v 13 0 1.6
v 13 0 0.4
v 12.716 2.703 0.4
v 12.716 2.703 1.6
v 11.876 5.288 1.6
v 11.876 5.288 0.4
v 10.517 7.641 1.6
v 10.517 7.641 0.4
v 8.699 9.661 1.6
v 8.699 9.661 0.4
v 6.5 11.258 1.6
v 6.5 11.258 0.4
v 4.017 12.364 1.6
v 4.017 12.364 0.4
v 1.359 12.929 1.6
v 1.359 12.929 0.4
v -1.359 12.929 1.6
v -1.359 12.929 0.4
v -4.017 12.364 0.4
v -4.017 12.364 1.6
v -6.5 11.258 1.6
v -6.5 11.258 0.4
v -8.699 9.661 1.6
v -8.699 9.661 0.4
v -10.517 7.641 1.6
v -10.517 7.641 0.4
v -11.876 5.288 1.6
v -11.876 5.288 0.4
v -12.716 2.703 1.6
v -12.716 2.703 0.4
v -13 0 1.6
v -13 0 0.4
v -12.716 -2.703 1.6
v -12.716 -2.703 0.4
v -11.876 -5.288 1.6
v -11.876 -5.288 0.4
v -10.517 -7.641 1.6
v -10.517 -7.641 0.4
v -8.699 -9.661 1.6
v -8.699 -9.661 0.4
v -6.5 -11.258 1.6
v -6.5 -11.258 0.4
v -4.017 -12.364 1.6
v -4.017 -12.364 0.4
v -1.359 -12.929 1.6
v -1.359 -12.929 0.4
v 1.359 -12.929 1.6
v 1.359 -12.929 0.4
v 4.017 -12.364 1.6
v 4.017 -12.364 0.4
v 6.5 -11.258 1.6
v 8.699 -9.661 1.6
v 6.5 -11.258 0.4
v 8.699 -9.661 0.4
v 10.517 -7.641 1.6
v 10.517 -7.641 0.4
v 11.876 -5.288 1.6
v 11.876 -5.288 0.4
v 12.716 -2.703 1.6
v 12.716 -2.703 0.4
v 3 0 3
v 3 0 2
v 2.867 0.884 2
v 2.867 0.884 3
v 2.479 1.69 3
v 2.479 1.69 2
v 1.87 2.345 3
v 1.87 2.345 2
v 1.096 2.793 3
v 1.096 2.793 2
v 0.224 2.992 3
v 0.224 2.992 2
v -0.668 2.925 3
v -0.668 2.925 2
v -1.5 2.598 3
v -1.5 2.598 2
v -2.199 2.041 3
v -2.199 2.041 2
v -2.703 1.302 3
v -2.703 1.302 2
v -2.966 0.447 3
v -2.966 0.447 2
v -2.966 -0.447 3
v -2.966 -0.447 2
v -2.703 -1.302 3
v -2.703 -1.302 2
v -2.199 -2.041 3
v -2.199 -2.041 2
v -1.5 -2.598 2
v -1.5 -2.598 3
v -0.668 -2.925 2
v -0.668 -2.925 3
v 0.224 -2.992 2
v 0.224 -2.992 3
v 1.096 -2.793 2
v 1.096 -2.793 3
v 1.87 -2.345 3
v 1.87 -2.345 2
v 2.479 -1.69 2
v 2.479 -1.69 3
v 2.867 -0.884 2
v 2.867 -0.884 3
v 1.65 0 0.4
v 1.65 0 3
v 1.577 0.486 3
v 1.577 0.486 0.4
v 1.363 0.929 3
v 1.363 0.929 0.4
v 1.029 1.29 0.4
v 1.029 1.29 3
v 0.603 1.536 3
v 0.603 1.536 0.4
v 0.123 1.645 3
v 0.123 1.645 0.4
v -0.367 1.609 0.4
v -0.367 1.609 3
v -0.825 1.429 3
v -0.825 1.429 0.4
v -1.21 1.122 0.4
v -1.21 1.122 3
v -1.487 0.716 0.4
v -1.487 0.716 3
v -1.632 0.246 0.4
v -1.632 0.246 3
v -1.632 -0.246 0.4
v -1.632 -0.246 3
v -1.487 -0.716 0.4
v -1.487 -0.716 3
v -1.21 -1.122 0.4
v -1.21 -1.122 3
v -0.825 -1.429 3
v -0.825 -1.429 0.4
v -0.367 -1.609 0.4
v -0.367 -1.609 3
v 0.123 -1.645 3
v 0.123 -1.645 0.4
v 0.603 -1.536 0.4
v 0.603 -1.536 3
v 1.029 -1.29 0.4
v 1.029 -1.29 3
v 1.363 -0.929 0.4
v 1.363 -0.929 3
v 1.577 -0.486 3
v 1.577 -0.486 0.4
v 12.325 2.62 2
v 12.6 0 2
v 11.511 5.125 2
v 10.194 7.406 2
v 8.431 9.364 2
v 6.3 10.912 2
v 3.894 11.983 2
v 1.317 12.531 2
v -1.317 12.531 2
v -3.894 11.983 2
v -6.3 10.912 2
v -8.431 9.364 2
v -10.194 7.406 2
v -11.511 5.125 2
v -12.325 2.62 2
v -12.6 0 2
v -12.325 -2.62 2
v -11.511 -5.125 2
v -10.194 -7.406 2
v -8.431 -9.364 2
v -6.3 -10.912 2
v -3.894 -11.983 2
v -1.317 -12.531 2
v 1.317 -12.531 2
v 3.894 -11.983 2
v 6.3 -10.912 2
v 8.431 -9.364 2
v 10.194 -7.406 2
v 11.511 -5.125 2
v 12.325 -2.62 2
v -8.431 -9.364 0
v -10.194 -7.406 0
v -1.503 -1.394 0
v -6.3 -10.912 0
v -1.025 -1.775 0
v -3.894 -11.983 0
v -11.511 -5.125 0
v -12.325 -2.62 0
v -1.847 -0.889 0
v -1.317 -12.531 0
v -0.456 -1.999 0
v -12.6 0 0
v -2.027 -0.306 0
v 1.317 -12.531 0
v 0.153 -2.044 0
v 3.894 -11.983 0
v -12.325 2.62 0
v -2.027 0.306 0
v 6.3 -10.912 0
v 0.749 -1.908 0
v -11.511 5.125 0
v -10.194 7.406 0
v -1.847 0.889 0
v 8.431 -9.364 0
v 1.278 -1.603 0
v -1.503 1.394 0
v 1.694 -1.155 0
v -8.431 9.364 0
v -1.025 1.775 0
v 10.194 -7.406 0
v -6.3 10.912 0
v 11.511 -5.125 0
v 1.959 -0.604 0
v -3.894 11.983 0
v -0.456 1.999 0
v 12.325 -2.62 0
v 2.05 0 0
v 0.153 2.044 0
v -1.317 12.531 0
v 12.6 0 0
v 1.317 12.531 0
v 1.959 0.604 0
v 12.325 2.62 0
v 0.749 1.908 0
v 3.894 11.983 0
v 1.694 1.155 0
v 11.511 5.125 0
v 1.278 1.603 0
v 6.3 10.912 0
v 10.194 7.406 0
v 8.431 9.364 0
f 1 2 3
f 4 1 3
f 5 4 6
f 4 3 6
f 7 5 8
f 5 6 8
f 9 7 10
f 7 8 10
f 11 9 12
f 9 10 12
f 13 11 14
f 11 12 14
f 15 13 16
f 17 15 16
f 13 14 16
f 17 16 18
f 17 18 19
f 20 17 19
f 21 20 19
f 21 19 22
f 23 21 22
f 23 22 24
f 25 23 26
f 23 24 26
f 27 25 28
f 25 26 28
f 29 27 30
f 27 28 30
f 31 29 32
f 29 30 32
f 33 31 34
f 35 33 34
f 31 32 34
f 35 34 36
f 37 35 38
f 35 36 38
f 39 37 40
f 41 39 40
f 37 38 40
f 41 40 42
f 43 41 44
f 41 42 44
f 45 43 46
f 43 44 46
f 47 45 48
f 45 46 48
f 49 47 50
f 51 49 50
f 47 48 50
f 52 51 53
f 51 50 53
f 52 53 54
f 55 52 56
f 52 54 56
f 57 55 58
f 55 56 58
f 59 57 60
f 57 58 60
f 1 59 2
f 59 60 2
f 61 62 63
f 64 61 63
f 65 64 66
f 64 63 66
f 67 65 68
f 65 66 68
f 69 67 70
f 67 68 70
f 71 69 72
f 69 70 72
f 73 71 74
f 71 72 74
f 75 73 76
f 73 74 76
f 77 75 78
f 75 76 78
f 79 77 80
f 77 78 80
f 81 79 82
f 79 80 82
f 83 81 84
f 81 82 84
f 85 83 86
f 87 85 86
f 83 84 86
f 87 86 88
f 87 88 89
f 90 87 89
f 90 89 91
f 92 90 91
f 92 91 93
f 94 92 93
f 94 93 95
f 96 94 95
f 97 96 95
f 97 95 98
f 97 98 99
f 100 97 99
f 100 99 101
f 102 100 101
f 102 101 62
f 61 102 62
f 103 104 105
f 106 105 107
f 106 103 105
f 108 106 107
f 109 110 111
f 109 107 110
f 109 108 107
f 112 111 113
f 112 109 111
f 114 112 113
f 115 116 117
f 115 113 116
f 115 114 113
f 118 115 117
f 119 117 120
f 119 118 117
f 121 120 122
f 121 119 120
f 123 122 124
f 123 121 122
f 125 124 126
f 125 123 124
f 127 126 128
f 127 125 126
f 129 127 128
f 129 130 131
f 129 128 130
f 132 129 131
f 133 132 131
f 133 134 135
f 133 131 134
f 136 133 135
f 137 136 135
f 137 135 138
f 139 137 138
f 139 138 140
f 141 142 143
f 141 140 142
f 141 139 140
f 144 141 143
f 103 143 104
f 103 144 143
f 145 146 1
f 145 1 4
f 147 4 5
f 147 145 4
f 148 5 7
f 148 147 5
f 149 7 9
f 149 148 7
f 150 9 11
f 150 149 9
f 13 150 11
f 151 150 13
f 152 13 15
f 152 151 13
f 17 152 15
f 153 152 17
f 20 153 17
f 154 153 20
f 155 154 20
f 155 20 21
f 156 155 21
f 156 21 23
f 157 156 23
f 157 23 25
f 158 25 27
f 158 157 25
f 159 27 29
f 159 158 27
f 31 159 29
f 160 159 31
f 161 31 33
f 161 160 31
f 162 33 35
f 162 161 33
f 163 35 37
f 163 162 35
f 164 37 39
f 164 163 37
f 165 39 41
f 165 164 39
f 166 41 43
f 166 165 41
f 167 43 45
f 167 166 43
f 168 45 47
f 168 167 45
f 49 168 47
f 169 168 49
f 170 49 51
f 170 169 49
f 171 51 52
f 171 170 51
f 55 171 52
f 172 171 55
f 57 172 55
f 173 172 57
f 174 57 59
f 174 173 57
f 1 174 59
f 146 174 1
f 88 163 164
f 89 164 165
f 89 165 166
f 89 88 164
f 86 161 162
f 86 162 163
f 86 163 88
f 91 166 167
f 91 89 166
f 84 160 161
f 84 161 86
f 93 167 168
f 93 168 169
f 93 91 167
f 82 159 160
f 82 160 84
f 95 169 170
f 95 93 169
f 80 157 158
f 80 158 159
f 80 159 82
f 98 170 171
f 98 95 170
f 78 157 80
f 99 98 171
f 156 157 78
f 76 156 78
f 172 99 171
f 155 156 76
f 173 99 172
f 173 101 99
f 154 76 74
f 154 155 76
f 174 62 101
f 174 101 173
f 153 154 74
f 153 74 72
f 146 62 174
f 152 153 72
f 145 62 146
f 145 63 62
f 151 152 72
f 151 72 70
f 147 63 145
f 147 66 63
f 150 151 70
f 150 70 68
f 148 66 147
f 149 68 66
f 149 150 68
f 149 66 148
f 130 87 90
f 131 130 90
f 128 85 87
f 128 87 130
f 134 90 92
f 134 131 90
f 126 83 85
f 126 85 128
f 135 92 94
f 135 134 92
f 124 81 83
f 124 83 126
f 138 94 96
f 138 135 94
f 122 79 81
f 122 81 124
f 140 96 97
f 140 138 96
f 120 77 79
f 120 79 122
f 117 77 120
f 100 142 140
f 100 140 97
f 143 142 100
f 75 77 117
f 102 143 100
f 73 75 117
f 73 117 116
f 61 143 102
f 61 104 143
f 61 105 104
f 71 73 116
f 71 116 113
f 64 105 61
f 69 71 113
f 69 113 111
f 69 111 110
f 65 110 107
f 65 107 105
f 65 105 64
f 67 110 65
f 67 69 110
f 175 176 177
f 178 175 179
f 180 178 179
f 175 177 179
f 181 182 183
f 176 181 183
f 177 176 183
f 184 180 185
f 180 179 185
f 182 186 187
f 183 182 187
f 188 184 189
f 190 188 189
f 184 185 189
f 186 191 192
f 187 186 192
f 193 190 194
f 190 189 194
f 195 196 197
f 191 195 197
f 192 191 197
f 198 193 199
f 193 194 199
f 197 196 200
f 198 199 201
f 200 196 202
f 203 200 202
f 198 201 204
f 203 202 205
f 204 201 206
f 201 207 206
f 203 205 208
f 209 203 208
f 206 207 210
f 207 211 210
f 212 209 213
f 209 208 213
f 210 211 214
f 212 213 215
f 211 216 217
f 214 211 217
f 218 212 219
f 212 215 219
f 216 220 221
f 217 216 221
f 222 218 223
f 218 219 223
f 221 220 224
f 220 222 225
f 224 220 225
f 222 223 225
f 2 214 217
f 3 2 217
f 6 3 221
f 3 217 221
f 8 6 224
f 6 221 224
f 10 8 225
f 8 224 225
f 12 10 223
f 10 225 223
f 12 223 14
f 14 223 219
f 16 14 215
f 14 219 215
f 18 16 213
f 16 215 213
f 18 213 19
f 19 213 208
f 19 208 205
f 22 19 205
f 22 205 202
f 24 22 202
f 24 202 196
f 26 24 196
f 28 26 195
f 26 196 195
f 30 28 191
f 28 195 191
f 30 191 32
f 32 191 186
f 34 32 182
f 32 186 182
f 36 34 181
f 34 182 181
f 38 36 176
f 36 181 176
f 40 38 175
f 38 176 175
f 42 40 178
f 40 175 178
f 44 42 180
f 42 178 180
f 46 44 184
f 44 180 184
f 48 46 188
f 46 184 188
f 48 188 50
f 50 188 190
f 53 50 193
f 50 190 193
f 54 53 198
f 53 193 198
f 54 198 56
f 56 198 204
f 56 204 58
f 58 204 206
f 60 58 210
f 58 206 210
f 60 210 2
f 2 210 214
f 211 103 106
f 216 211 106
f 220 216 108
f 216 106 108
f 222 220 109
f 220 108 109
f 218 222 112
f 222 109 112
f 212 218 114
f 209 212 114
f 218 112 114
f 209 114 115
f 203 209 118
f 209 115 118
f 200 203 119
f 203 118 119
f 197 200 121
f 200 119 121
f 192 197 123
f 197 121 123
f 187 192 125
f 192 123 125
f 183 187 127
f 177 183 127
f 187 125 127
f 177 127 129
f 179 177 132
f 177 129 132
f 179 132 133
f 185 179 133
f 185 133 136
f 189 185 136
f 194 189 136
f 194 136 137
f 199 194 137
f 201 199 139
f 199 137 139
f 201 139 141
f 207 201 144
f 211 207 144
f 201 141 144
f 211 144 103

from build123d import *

# Parameters (mm, degrees)
CYLINDER016_R                              = 1.65
CYLINDER016_DEPTH                          = 10
CYLINDER014_R                              = 13
CYLINDER014_DEPTH                          = 2
CYLINDER015_R                              = 3
CYLINDER015_DEPTH                          = 3
CHAMFER004013007011015006009007001083_SIZE = 0.4


with BuildPart() as cylinder016:
    # Cylinder016 → Cylinder016 (new body)
    with BuildSketch(Plane.XY):
        Circle(CYLINDER016_R)
    extrude(amount=CYLINDER016_DEPTH)


with BuildPart() as cylinder014:
    # Cylinder014 → Cylinder014 (new body)
    with BuildSketch(Plane.XY):
        Circle(CYLINDER014_R)
    extrude(amount=CYLINDER014_DEPTH)


with BuildPart() as stopper:
    # Cylinder015 → Cylinder015 (new body)
    with BuildSketch(Plane.XY):
        Circle(CYLINDER015_R)
    extrude(amount=CYLINDER015_DEPTH)

    # Fusion006002011004053036004001028003005014018035002007006011: union Cylinder014
    add(cylinder014.part)

    # Cut008004003004014002002005003004003002003021022001002001106: cut Cylinder016
    add(cylinder016.part, mode=Mode.SUBTRACT)

    # Chamfer004013007011015006009007001083
    chamfer004013007011015006009007001083_edges = [stopper.edges().sort_by_distance(p)[0] for p in [
        (-13, 0, 2),
        (-13, 0, 0),
        (-1.65, 0, 0),
    ]]
    chamfer(chamfer004013007011015006009007001083_edges, length=CHAMFER004013007011015006009007001083_SIZE)


solid = stopper.part
